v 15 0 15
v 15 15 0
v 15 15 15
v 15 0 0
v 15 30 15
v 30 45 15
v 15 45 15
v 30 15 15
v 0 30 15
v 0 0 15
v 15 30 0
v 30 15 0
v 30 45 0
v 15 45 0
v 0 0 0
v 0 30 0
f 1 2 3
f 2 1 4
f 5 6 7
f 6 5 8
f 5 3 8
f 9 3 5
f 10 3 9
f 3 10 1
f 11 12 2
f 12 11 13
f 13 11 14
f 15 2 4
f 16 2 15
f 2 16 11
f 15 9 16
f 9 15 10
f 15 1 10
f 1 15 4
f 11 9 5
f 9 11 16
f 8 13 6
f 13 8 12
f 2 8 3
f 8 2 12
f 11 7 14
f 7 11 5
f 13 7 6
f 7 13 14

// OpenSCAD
// Fongo piece 12: Zigzag. GPL-3.0; see README.txt.
// All cube positions derive from the canonical catalogue. z points up.
unit = 15; // mm, scale all pieces AND cards together
positions = [[0,0,0],[0,1,0],[1,1,0],[1,2,0]];
union() { for (p = positions) translate(p * unit) cube([unit, unit, unit]); }
